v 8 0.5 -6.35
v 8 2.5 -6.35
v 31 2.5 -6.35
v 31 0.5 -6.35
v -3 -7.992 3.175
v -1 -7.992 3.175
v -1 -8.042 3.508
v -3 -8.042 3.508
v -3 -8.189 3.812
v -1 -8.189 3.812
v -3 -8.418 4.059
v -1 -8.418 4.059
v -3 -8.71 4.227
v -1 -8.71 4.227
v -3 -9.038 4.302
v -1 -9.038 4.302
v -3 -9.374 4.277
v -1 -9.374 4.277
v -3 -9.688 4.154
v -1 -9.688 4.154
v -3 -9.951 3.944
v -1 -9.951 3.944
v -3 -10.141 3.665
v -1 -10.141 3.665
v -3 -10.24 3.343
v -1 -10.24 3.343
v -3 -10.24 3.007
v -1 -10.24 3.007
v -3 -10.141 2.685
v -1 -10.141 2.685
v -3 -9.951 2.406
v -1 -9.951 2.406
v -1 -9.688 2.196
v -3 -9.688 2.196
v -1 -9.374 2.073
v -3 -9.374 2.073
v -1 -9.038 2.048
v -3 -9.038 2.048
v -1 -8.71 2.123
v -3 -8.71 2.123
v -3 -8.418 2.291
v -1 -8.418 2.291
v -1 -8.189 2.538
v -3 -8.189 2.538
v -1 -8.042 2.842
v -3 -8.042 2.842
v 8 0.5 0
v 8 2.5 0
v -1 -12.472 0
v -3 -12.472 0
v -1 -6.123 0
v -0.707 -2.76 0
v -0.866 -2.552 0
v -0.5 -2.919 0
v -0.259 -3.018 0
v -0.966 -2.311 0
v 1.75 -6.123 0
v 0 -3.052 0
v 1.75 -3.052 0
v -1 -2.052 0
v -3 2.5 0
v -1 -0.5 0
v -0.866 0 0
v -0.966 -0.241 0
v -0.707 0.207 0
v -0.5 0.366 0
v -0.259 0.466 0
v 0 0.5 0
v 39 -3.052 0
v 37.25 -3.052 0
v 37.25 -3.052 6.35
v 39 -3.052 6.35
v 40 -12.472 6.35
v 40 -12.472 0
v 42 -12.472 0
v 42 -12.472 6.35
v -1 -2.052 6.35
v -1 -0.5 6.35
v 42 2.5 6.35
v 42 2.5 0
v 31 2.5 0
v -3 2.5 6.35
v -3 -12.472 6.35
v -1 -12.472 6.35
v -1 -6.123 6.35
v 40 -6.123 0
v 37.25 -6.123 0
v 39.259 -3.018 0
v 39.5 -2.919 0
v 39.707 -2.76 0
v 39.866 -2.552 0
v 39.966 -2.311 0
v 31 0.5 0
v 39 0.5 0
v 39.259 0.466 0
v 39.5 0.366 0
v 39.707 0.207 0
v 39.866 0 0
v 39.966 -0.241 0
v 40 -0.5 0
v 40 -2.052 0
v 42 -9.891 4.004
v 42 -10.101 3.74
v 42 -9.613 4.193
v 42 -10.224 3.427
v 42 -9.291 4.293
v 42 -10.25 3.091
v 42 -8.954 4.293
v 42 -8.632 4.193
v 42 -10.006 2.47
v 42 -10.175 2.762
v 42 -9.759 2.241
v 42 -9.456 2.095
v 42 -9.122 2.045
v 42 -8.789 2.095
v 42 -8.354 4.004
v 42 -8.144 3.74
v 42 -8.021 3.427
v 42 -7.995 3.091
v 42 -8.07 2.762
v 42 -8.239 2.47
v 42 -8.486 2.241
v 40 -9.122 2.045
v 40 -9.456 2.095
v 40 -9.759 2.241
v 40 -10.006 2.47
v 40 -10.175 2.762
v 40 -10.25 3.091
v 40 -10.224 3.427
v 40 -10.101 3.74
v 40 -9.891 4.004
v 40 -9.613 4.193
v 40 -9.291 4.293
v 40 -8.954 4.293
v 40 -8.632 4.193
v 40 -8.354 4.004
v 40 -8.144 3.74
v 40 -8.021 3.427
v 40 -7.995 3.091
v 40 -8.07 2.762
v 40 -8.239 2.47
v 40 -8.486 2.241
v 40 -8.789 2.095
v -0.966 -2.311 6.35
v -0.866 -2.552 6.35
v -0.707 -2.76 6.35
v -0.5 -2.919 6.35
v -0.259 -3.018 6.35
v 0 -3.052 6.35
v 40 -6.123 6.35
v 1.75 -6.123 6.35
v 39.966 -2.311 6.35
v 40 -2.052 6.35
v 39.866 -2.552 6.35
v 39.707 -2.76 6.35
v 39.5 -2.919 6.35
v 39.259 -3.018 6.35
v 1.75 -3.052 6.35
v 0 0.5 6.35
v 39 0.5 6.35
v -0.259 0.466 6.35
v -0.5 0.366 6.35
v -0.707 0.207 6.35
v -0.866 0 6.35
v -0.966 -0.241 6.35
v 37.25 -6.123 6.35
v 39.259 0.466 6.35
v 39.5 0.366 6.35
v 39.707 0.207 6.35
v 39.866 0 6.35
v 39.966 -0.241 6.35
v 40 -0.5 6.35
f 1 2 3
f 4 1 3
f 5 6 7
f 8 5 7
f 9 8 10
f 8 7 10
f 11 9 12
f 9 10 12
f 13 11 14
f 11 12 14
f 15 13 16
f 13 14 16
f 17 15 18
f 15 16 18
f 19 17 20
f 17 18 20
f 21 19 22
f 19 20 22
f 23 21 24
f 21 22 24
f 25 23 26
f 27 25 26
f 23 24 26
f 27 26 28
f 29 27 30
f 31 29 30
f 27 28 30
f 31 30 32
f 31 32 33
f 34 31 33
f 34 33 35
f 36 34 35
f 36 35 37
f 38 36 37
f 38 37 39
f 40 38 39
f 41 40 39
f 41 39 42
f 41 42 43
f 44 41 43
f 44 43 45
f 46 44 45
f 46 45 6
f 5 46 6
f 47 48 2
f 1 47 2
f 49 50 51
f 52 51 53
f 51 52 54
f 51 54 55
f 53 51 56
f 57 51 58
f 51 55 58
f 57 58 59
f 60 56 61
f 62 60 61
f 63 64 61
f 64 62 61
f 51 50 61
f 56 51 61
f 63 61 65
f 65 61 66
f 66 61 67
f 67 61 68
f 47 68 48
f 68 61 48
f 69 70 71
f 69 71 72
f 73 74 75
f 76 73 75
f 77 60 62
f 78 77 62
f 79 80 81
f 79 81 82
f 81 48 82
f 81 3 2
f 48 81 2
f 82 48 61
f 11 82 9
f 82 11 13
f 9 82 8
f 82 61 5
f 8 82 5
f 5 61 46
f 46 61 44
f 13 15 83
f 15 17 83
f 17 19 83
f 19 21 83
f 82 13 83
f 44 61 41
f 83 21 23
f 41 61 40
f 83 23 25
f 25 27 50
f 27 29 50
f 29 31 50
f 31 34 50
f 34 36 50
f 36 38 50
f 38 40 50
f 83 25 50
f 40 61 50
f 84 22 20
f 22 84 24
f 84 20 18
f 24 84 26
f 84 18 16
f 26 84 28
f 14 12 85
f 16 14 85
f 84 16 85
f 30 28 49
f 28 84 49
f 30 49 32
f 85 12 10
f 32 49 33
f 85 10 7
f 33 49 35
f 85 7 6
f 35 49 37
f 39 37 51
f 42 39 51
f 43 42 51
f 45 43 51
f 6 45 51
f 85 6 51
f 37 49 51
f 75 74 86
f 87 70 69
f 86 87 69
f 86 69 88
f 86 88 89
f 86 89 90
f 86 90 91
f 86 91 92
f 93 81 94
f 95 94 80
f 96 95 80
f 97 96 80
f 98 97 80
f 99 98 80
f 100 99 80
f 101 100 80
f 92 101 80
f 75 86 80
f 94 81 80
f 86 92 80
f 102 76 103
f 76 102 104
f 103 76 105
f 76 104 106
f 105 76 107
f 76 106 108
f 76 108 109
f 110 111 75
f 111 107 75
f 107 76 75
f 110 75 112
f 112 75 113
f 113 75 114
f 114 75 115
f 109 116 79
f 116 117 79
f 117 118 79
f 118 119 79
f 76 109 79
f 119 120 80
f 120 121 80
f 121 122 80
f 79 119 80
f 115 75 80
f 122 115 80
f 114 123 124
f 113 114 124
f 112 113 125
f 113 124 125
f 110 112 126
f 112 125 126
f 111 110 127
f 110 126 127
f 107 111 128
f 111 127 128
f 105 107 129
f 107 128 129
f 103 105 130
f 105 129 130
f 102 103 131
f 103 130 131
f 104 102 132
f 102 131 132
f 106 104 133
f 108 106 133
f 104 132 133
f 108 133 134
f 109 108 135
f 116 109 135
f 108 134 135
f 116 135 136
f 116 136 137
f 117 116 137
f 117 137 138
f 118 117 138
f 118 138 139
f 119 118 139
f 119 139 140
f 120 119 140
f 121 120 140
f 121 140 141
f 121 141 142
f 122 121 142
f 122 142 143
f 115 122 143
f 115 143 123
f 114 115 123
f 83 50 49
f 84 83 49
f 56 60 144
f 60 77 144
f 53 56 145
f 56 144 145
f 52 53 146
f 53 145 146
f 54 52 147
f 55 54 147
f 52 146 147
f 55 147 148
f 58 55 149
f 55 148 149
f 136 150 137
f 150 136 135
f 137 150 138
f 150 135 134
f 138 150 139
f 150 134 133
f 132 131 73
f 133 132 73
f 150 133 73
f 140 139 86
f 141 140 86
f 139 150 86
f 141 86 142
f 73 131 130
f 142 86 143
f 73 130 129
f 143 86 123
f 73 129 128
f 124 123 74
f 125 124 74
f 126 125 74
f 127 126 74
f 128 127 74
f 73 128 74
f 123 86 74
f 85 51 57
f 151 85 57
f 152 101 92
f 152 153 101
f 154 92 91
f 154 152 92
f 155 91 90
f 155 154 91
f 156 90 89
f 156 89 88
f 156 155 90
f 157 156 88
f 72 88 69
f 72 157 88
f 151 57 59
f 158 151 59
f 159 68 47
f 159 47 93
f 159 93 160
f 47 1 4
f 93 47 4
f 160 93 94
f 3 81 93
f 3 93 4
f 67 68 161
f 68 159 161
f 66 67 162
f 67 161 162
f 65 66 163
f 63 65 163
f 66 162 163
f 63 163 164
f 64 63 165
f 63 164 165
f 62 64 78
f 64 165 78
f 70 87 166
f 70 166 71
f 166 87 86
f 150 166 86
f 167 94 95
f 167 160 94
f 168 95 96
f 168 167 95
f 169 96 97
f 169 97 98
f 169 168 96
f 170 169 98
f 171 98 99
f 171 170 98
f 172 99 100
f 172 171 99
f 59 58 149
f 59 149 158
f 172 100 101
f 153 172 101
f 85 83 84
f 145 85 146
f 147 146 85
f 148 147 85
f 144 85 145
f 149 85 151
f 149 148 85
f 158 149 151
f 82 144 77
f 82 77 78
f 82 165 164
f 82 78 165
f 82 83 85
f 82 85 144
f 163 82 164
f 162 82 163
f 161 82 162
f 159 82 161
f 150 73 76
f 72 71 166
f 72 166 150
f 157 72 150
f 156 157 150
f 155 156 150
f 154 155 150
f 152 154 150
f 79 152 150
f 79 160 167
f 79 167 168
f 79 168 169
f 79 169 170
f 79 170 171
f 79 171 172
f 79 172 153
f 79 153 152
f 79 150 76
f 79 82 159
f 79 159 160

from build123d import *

# Parameters (mm, degrees)
SKETCH2_W                           = 2.75
SKETCH2_H                           = 3.07
BOSS_EXTRUDE2_DEPTH                 = 6.35
SKETCH3_W                           = 23
SKETCH3_H                           = 6.35
BOSS_EXTRUDE3_DEPTH                 = 2
F_4_40_TAPPED_HOLE1_D               = 2.2606
F_4_40_TAPPED_HOLE1_DEPTH           = 3.91
F_4_40_TAPPED_HOLE1_TIP             = 0.679152758
F_4_40_TAPPED_HOLE1_ON_FACE_2_D     = 2.2606
F_4_40_TAPPED_HOLE1_ON_FACE_2_DEPTH = 3.91
F_4_40_TAPPED_HOLE1_ON_FACE_2_TIP   = 0.679152758
FILLET1_R                           = 1


with BuildPart() as part:
    # Sketch2 → Boss-Extrude2 (new body)
    with BuildSketch(Plane.XY):
        Polygon((-3, -12.4725), (-1, -12.4725), (-1, -6.1225), (-1, -3.0525), (-1, 0.5), (40, 0.5), (40, -3.0525), (40, -6.1225), (40, -12.4725), (42, -12.4725), (42, 2.5), (-3, 2.5), align=None)
        with Locations((0.375, -4.5875)):
            Rectangle(SKETCH2_W, SKETCH2_H)
        with Locations((38.625, -4.5875)):
            Rectangle(SKETCH2_W, SKETCH2_H)
    extrude(amount=BOSS_EXTRUDE2_DEPTH)

    # Sketch3 → Boss-Extrude3 (add)
    with BuildSketch(Plane(origin=(0, 2.5, 0), x_dir=(1, 0, 0), z_dir=(0, 1, 0))):
        with Locations((19.5, 3.175)):
            Rectangle(SKETCH3_W, SKETCH3_H)
    extrude(amount=-BOSS_EXTRUDE3_DEPTH)

    # #4-40 Tapped Hole1
    with Locations(Plane(origin=(-3, -9.1225, 3.175), x_dir=(0, -1, 0), z_dir=(-1, 0, 0))):
        with Locations((0, 0)):
            Hole(F_4_40_TAPPED_HOLE1_D / 2, depth=F_4_40_TAPPED_HOLE1_DEPTH)
            with Locations((0, 0, -(F_4_40_TAPPED_HOLE1_DEPTH + F_4_40_TAPPED_HOLE1_TIP / 2))):  # 118° drill point
                Cone(0, F_4_40_TAPPED_HOLE1_D / 2, F_4_40_TAPPED_HOLE1_TIP, mode=Mode.SUBTRACT)

    # #4-40 Tapped Hole1 on face 2
    with Locations(Plane(origin=(42, -9.1225, 3.175), x_dir=(0, 0, 1), z_dir=(1, 0, 0))):
        with Locations((0, 0)):
            Hole(F_4_40_TAPPED_HOLE1_ON_FACE_2_D / 2, depth=F_4_40_TAPPED_HOLE1_ON_FACE_2_DEPTH)
            with Locations((0, 0, -(F_4_40_TAPPED_HOLE1_ON_FACE_2_DEPTH + F_4_40_TAPPED_HOLE1_ON_FACE_2_TIP / 2))):  # 118° drill point
                Cone(0, F_4_40_TAPPED_HOLE1_ON_FACE_2_D / 2, F_4_40_TAPPED_HOLE1_ON_FACE_2_TIP, mode=Mode.SUBTRACT)

    # Fillet1
    fillet1_edges = [part.edges().sort_by_distance(p)[0] for p in [
        (40, 0.5, 3.175),
        (-1, 0.5, 3.175),
        (-1, -3.0525, 3.175),
        (40, -3.0525, 3.175),
    ]]
    fillet(fillet1_edges, radius=FILLET1_R)


solid = part.part
